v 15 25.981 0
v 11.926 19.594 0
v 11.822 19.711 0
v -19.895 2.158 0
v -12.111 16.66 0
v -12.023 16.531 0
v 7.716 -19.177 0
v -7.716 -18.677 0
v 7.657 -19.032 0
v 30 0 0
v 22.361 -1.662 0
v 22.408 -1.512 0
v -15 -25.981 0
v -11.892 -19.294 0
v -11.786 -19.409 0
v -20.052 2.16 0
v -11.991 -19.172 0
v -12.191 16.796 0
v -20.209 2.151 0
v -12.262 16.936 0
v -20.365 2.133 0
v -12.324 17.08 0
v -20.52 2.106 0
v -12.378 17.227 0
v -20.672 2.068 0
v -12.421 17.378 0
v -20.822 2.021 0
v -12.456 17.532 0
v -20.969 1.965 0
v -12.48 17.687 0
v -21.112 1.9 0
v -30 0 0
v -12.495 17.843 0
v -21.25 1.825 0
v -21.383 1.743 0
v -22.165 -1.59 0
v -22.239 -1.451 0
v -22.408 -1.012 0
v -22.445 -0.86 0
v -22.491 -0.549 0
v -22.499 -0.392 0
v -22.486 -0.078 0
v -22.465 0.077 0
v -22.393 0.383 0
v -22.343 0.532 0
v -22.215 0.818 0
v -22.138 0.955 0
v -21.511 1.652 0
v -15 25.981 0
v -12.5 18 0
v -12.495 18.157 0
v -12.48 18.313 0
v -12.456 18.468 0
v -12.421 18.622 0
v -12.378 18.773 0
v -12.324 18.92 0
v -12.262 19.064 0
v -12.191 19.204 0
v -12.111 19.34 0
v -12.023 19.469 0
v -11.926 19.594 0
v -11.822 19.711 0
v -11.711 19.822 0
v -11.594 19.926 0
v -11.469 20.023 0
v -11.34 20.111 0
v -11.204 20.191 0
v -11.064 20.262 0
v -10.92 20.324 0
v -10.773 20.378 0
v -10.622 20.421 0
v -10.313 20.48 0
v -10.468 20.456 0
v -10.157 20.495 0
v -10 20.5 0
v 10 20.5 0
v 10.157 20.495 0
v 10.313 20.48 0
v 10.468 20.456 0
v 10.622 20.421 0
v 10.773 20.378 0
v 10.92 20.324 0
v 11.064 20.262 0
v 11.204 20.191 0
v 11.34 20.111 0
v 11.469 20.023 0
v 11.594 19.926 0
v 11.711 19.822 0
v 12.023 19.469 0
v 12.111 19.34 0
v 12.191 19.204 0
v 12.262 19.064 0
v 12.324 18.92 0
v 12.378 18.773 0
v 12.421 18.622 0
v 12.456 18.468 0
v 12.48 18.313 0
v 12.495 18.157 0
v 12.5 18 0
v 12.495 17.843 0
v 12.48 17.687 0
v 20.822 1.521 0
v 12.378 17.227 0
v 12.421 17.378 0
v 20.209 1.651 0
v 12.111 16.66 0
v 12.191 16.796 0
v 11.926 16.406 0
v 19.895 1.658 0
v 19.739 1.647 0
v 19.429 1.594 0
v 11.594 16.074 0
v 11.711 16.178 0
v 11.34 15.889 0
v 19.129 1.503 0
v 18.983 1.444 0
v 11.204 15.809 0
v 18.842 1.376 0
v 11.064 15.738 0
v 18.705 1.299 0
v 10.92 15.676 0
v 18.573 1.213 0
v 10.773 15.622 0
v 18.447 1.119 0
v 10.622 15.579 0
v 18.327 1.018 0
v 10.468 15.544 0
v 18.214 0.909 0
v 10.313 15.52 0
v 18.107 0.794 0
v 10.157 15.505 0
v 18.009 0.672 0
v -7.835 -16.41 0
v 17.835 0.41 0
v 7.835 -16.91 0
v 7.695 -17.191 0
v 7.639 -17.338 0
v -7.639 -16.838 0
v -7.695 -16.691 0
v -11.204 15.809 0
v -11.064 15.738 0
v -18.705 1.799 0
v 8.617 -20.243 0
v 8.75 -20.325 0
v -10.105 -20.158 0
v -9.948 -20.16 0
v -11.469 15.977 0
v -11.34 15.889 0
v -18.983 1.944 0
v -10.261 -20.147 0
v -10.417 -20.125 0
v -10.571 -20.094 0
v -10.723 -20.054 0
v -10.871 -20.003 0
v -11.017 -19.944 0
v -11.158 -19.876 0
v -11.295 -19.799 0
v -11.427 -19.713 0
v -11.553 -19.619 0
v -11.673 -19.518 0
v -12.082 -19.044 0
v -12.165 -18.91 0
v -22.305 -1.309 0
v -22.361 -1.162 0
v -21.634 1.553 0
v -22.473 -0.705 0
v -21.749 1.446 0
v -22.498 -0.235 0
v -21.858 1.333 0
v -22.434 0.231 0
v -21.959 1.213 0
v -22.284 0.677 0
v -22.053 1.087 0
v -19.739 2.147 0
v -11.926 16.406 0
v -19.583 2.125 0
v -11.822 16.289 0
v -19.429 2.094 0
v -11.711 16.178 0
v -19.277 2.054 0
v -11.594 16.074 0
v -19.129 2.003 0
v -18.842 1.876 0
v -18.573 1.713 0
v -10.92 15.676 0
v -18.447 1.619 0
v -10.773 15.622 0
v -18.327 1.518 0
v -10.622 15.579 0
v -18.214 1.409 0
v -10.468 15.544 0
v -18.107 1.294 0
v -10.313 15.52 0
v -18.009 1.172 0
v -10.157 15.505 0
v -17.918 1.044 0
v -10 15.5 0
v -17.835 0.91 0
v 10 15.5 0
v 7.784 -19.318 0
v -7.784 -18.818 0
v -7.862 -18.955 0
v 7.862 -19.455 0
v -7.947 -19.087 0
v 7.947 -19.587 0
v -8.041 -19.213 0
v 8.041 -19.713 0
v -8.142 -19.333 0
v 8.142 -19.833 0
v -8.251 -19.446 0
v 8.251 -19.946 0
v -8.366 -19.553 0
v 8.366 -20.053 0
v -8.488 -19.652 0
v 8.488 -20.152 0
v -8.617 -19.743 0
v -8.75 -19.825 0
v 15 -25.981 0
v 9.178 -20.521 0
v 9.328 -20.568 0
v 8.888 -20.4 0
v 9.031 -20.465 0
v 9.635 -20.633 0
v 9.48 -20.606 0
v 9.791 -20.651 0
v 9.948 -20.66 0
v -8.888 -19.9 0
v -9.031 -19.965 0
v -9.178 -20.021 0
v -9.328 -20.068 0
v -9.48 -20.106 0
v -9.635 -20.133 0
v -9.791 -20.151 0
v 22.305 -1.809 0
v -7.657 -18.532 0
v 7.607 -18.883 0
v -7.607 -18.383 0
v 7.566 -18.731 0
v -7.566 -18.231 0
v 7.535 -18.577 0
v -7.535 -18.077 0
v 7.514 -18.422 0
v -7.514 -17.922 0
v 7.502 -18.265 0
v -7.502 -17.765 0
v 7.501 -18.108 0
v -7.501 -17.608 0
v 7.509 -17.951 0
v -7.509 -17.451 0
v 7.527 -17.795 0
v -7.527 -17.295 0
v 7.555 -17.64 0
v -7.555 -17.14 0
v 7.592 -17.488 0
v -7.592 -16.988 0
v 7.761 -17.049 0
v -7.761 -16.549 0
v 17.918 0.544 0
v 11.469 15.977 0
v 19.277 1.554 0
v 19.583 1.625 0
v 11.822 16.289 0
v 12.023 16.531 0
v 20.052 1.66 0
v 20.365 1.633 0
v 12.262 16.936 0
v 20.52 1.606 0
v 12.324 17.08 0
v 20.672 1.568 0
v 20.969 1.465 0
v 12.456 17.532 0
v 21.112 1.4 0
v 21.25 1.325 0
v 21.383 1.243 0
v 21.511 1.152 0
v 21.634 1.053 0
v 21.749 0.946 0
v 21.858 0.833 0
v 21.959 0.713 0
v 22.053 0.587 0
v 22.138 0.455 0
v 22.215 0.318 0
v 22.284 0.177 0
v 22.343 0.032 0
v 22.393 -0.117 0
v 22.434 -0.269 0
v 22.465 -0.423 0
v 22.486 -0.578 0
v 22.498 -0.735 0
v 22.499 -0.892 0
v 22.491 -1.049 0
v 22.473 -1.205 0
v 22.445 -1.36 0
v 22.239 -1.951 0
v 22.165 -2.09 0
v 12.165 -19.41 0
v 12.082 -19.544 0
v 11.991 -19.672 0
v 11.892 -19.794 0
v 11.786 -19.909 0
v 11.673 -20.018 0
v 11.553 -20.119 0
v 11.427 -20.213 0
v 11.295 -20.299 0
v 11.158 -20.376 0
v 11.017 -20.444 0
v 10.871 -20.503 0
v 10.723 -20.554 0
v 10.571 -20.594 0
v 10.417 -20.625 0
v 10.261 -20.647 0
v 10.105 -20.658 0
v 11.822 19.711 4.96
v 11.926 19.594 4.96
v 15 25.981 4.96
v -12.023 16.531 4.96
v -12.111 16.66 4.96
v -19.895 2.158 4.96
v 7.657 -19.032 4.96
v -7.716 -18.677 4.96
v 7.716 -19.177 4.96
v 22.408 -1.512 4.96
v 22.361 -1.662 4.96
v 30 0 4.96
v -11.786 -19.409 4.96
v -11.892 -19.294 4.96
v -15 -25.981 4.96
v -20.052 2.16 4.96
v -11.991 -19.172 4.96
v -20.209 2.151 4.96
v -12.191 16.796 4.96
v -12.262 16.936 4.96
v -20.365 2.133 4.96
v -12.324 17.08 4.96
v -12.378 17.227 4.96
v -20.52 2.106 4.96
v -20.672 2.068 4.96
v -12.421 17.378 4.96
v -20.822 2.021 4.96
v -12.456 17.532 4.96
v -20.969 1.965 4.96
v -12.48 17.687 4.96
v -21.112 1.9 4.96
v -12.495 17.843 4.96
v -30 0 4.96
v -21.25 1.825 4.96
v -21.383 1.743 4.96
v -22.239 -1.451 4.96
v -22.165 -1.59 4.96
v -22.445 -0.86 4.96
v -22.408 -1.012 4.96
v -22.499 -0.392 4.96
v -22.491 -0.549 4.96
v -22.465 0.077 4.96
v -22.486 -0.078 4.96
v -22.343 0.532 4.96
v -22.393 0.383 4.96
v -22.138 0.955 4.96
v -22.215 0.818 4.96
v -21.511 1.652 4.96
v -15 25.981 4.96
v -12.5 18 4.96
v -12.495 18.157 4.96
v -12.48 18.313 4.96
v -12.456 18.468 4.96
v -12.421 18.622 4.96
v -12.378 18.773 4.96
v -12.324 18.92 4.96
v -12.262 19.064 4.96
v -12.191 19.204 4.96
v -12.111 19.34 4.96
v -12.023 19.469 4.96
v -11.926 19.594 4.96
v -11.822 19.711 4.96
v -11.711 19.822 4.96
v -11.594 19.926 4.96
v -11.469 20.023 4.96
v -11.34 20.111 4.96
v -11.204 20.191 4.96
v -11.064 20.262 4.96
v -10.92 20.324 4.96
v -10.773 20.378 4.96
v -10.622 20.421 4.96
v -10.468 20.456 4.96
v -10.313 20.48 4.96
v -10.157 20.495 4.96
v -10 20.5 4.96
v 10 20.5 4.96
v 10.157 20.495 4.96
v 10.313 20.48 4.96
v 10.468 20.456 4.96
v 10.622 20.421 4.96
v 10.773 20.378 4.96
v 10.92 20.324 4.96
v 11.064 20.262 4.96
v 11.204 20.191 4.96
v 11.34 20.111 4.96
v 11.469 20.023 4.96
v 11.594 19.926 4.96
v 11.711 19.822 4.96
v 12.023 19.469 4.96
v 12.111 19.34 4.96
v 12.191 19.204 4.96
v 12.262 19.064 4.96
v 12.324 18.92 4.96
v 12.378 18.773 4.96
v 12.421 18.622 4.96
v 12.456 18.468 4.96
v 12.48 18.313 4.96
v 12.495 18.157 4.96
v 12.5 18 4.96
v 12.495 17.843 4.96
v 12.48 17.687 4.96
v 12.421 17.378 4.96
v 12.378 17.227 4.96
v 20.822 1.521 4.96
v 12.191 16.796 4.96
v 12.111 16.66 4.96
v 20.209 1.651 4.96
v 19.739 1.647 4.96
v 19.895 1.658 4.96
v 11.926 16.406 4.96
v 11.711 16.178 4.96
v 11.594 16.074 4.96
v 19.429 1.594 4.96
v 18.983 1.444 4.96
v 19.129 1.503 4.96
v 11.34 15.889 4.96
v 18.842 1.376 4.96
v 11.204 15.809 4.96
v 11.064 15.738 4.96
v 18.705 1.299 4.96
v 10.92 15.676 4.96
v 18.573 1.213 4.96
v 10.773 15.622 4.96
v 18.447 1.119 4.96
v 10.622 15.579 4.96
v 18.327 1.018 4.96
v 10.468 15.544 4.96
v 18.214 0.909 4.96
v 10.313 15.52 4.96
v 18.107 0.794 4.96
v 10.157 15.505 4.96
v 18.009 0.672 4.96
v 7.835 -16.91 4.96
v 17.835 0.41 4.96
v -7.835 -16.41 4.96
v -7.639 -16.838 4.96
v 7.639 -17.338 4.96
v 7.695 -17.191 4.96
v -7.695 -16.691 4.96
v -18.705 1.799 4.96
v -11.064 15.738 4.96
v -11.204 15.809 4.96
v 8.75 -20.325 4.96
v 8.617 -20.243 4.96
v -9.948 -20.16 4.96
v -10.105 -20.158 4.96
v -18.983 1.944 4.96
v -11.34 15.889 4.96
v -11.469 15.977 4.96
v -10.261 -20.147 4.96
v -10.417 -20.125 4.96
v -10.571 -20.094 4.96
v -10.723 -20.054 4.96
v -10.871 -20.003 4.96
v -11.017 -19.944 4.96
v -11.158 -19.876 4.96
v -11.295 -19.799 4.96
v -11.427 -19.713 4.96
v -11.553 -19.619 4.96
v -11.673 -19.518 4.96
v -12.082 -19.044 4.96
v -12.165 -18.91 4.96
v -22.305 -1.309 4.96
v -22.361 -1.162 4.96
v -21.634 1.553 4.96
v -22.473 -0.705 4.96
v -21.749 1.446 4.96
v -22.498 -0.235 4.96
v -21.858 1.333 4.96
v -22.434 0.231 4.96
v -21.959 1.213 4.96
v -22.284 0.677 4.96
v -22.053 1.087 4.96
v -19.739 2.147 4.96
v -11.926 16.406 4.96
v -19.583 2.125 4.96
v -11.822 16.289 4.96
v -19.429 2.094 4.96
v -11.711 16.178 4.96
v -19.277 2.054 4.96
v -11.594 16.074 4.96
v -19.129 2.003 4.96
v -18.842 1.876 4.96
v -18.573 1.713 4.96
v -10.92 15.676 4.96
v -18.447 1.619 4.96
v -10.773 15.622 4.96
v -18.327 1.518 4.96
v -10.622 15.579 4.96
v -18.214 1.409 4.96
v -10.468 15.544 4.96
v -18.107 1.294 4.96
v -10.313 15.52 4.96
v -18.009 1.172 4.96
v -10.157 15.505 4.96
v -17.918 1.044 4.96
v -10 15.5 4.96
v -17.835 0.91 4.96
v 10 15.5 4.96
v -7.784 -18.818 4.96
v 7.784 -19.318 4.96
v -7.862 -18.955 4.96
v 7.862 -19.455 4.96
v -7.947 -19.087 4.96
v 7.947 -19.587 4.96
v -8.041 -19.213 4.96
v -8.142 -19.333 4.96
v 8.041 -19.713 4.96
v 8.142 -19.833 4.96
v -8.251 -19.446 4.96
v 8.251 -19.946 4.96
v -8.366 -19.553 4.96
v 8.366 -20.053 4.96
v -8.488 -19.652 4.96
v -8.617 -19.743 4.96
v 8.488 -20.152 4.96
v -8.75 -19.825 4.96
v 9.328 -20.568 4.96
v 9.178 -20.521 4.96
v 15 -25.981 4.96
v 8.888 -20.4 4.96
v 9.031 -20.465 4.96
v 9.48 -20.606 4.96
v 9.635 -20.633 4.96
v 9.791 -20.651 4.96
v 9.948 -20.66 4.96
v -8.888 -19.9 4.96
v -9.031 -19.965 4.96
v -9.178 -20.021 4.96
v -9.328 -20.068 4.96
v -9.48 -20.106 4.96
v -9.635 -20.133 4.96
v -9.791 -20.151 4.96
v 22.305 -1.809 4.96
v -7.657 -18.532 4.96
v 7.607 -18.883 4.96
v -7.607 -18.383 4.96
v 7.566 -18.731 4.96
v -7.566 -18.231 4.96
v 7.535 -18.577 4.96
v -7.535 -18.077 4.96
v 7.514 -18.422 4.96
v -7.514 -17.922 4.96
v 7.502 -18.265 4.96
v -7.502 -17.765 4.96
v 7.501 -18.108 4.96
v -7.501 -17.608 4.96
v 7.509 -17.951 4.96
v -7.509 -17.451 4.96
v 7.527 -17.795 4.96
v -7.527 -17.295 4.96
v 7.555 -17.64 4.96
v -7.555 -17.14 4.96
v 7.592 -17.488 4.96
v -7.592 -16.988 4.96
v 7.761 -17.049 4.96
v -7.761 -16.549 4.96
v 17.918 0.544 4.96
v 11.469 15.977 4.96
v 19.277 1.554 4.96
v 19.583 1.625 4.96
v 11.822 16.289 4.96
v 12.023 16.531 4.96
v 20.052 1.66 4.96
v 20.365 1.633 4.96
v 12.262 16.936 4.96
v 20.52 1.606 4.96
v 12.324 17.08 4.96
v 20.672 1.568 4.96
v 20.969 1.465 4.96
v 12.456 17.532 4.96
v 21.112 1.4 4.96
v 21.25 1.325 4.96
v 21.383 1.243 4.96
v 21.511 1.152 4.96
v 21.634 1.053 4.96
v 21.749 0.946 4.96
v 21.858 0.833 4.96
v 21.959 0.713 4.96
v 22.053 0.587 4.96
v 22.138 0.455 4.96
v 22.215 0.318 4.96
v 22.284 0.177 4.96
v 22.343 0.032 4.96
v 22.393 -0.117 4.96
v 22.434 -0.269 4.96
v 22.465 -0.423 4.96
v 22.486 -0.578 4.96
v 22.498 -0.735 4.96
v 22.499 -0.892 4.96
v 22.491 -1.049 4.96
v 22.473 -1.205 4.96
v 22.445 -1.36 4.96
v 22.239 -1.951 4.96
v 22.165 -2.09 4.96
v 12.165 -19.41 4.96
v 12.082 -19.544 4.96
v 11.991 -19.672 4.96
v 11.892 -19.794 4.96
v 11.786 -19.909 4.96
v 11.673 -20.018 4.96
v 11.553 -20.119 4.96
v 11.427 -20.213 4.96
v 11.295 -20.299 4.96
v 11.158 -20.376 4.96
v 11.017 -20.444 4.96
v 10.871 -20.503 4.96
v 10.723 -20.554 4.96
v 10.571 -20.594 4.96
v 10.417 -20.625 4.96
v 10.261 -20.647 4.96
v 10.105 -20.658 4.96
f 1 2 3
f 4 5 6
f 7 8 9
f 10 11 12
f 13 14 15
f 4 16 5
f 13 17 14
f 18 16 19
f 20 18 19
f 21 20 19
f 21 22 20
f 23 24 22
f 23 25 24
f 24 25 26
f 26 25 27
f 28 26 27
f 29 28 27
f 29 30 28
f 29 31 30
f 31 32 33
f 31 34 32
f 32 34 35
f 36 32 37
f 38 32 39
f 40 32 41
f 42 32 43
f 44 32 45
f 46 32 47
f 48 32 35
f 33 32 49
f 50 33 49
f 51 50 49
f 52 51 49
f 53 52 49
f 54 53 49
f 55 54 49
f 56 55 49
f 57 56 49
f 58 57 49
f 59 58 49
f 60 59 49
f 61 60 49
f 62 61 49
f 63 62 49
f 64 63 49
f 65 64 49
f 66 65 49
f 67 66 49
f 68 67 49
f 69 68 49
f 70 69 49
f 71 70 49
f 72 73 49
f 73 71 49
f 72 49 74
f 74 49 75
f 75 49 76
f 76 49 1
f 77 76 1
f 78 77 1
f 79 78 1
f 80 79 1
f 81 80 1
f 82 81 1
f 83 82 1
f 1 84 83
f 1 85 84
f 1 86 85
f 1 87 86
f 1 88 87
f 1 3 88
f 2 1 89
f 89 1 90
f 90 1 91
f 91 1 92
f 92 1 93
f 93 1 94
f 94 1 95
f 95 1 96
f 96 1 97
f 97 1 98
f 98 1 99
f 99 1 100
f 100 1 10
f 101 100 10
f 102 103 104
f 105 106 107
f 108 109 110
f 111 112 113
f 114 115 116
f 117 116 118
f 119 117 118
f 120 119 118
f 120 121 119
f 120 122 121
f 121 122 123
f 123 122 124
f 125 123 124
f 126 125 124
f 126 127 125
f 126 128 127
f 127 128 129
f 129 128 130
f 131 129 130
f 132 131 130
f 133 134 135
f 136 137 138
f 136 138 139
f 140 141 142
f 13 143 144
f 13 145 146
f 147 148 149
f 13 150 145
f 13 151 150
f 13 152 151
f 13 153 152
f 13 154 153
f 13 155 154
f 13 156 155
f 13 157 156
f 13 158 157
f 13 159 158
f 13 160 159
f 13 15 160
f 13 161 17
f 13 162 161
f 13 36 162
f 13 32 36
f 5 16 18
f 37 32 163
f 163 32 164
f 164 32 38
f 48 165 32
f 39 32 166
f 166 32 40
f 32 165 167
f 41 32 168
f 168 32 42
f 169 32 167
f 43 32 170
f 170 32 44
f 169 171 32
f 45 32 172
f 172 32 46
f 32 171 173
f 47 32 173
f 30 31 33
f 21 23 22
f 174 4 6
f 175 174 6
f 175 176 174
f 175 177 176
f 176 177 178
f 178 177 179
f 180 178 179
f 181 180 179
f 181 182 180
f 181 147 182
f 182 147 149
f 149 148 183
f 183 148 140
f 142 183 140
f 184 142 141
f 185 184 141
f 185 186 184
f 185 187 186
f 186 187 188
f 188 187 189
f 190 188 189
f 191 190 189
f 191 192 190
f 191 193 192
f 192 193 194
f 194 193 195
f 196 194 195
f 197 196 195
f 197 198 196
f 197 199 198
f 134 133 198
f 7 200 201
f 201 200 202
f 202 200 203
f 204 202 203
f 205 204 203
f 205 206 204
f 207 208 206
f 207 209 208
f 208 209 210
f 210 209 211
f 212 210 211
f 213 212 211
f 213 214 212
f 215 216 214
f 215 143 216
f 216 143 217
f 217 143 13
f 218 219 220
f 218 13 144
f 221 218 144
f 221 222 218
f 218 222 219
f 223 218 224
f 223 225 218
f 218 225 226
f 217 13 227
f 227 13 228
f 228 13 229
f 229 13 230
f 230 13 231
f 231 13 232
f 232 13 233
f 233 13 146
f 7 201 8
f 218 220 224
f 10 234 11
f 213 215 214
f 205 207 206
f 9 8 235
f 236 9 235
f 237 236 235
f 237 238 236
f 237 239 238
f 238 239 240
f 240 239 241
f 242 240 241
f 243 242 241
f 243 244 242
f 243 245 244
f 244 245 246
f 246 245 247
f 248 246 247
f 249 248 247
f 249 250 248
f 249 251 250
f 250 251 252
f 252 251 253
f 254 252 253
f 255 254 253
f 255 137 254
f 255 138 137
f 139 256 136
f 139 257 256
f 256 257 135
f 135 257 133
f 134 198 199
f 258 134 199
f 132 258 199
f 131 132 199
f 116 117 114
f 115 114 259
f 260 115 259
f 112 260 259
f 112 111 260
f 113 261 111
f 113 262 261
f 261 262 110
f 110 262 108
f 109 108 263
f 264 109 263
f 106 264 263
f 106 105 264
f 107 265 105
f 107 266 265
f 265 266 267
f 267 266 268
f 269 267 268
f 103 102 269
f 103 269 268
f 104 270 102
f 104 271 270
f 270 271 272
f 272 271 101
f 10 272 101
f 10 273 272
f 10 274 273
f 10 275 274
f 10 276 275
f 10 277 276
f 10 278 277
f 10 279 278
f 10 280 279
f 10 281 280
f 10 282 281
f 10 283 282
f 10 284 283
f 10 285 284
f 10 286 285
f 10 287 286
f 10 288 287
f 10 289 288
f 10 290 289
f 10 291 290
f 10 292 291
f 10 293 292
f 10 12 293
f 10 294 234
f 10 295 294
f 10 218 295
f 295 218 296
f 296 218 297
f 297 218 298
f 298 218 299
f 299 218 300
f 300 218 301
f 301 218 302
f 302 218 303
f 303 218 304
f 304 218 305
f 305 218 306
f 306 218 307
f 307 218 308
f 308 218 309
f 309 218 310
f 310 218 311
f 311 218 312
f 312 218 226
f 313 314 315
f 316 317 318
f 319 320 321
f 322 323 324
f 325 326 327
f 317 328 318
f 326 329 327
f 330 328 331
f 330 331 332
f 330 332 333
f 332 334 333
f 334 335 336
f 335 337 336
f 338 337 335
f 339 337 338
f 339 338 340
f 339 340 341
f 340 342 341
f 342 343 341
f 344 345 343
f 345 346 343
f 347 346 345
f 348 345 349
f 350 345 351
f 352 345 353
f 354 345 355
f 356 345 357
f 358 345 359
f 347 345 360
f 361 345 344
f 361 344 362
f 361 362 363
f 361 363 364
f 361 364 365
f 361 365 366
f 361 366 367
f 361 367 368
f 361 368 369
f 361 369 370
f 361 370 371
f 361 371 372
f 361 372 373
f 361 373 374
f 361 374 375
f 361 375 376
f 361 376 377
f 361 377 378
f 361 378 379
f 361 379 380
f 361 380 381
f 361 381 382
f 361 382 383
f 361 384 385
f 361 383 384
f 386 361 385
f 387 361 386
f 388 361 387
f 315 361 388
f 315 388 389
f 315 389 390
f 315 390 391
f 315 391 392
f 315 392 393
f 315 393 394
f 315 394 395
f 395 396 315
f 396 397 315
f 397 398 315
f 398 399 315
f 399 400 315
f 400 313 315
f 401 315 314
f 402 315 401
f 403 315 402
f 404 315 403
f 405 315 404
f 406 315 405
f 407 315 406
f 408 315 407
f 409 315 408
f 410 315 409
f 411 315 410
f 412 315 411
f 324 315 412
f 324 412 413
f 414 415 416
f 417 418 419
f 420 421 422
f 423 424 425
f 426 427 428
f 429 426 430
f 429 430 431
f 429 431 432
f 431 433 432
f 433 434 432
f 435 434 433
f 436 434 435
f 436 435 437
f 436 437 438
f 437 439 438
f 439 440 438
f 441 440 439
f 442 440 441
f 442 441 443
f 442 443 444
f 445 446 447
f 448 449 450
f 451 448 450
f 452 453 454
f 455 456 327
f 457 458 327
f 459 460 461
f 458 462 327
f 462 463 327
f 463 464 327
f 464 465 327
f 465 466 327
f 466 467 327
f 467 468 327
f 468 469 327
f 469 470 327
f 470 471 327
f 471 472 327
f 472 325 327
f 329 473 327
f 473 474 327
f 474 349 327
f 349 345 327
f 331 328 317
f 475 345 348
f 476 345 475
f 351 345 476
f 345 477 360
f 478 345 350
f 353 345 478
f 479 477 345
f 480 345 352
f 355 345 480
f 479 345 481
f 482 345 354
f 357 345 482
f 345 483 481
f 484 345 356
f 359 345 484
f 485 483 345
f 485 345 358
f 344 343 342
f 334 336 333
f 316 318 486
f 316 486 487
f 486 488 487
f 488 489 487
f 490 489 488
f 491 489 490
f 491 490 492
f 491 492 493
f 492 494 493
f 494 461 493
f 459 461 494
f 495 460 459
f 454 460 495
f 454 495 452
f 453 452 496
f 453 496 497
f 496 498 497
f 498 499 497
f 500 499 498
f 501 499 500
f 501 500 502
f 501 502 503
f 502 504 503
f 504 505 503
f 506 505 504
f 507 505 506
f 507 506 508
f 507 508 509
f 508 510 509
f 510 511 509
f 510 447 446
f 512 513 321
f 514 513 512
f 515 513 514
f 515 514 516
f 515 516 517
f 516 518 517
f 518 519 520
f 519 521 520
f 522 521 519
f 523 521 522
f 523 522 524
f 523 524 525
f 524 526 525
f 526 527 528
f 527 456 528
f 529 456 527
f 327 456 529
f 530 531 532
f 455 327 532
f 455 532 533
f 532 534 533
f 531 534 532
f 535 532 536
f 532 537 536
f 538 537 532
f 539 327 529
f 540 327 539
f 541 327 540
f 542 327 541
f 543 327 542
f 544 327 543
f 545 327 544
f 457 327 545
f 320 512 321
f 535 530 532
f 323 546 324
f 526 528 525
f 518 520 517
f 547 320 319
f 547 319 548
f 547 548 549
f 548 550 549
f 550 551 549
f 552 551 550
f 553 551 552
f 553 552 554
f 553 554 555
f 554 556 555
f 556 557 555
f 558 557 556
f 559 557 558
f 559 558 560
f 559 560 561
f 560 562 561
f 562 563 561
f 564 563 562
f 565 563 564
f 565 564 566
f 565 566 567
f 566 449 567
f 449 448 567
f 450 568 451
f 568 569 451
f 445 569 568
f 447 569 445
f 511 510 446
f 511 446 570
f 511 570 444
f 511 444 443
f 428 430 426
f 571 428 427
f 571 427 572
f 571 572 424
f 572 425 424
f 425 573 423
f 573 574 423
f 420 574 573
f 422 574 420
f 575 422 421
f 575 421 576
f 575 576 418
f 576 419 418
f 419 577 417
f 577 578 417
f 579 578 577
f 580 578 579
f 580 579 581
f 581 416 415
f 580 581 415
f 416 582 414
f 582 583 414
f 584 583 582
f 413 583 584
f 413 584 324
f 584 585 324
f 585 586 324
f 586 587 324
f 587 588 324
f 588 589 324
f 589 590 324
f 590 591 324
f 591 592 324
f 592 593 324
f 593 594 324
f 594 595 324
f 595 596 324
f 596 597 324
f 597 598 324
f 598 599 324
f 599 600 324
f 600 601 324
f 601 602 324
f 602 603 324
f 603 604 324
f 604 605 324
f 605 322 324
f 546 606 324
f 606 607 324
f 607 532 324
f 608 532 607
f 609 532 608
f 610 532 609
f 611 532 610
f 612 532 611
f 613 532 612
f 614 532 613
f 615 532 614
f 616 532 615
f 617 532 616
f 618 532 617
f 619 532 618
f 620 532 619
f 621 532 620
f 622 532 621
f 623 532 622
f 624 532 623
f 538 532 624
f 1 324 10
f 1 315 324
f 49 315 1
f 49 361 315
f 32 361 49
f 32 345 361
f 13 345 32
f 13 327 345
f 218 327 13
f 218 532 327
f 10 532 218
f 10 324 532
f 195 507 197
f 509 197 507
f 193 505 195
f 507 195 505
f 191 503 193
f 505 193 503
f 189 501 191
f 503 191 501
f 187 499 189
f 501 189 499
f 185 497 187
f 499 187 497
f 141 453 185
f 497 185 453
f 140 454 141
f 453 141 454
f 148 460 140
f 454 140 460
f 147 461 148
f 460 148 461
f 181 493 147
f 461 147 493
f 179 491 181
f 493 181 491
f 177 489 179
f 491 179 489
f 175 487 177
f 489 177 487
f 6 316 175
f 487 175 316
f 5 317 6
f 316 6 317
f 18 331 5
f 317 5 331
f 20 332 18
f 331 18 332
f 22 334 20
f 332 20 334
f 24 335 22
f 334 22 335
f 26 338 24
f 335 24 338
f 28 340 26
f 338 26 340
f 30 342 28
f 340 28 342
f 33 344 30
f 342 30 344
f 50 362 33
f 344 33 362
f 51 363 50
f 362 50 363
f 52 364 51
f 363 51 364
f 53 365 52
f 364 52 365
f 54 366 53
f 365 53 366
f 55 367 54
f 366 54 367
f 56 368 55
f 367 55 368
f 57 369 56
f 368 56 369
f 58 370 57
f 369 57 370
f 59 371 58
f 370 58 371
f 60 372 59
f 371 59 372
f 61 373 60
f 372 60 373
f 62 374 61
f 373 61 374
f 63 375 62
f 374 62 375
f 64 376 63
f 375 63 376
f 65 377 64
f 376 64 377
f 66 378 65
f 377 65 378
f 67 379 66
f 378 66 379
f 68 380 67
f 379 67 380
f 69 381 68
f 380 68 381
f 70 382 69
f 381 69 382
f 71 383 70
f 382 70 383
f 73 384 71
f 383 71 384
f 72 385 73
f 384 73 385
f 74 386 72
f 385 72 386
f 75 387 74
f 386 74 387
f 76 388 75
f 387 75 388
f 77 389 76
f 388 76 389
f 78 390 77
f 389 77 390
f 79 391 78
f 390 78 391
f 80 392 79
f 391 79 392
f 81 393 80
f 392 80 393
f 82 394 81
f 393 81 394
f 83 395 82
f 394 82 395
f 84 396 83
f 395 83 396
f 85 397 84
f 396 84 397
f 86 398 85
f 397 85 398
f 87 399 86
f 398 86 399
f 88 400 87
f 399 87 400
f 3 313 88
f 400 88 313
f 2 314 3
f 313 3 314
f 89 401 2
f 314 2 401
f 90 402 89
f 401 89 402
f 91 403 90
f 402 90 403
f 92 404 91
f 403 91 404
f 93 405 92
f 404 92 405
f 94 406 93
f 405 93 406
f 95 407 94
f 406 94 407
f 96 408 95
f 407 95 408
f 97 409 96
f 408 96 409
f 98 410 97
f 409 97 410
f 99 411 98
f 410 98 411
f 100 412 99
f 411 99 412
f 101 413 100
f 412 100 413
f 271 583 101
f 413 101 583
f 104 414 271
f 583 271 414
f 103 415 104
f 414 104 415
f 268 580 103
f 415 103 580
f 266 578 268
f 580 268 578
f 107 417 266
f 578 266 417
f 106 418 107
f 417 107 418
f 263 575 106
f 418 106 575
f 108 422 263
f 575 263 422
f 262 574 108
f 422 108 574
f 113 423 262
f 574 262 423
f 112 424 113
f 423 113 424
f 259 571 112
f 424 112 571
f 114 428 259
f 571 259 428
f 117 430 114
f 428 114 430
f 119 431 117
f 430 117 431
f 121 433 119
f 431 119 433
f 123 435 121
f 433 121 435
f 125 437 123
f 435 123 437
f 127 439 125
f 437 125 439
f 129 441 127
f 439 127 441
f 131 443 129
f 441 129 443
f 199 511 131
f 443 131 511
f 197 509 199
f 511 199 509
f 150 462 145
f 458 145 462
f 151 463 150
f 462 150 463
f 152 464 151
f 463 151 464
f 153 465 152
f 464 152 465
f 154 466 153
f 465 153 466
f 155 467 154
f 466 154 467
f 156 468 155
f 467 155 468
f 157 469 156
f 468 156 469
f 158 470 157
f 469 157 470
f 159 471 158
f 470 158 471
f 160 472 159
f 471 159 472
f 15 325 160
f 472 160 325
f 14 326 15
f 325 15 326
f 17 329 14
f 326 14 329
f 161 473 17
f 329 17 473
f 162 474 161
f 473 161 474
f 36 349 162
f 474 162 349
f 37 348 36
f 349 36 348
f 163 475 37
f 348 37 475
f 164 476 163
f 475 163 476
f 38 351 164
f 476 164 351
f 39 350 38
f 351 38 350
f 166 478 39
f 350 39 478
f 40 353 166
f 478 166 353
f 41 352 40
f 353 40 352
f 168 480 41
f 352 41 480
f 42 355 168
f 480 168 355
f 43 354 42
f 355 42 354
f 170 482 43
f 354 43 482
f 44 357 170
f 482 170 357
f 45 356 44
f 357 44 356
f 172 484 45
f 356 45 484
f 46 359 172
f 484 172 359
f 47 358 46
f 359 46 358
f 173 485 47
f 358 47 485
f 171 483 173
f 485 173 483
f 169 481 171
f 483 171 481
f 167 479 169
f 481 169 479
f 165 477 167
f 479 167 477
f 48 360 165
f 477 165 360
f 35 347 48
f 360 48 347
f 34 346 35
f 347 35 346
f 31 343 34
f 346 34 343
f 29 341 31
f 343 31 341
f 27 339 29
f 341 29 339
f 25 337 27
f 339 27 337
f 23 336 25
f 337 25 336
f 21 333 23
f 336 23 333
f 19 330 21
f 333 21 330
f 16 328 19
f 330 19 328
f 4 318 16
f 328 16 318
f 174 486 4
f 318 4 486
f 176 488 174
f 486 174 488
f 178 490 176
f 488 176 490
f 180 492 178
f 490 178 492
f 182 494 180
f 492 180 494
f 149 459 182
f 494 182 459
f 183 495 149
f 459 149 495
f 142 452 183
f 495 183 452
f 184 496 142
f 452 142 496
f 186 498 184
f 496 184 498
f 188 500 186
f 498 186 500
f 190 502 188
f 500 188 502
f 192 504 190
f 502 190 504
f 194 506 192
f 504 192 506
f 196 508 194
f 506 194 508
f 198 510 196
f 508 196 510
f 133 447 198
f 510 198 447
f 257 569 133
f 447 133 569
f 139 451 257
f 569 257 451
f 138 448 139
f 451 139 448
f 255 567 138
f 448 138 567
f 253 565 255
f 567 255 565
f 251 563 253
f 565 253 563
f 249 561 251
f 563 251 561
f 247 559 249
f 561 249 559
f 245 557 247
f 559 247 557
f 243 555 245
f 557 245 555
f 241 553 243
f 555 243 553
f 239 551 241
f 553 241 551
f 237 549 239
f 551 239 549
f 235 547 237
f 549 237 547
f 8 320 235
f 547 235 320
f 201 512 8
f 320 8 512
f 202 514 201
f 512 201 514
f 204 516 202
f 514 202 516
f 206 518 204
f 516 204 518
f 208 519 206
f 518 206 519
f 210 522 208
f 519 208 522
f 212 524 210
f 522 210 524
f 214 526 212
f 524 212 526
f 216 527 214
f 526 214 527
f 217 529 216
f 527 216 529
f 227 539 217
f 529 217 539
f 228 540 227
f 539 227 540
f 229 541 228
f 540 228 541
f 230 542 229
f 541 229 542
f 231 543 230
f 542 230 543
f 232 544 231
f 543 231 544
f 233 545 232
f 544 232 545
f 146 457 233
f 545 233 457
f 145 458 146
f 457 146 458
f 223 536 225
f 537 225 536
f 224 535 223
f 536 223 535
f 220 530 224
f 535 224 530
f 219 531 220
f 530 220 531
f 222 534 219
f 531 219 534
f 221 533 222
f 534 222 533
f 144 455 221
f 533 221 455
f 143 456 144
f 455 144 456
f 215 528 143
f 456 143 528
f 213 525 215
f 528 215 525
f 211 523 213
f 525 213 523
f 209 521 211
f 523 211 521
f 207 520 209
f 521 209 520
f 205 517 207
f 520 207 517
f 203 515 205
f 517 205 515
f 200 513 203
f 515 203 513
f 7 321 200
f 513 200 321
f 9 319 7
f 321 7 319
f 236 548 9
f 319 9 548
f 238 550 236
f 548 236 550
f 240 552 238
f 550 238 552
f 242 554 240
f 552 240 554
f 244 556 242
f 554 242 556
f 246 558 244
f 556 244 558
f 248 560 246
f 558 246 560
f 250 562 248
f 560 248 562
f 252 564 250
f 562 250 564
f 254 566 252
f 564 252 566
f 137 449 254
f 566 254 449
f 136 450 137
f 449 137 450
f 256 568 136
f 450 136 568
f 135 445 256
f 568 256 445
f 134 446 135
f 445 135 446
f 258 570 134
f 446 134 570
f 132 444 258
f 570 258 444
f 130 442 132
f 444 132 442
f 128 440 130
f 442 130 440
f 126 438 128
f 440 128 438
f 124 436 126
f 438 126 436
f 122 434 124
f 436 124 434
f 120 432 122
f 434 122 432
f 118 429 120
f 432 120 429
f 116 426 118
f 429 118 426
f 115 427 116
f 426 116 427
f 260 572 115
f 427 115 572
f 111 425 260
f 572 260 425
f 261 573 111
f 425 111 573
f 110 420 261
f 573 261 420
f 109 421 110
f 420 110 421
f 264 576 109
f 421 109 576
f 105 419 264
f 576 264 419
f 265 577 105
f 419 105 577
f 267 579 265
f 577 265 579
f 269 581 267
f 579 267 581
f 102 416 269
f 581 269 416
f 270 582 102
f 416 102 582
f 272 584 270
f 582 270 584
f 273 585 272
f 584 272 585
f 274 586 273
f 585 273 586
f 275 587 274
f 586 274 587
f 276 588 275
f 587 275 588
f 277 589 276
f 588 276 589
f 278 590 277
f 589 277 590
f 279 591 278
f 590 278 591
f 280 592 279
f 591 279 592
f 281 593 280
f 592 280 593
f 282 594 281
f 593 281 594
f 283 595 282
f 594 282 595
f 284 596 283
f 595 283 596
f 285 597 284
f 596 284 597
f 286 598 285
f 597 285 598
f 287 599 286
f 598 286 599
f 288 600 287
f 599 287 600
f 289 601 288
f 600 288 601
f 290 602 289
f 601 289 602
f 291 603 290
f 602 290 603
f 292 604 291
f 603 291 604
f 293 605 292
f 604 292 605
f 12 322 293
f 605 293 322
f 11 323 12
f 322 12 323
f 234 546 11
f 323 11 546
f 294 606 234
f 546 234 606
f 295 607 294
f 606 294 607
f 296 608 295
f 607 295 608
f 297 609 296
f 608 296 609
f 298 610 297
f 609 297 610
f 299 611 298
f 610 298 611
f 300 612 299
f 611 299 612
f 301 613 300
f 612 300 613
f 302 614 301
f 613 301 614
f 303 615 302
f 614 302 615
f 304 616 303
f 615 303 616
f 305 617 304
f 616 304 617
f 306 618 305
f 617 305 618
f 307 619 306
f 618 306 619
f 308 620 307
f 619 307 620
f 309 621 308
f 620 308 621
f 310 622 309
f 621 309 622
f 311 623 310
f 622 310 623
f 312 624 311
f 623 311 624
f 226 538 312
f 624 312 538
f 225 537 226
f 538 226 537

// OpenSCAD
/*

*/

$fn=100;
NozzleWidth = 1.0;
LayerHeight = 0.24;
InitialLayerHeight = 0.4;
mmPerInch = 25.4;
wallCount = 2;

function InchTomm(inches = 1) = inches * mmPerInch;
function height2layers(mm = 1) = mm/LayerHeight;
function layers2Height(layers) = InitialLayerHeight + ((layers - 1) * LayerHeight);
function BaseHeight() = layers2Height(6);
function WallThickness(count) = count * NozzleWidth;

Build();

module Build(args) 
{
    Tool();
}

module Tool()
{
    radius = 30;
    xvalue = -10;
    slotWidth = 20;
    slotRadius = 2.5;
    WallThickness = WallThickness(9.5);
    echo( xymove=xymove(angle= 90, width = radius));

    linear_extrude(height = layers2Height(20))
    {    
    difference()
        {
            circle(r=radius, $fn=6);
            
            translate([0,18,0])      
            hull() 
            {
                translate([-slotWidth/2,0,0])
                circle(r=slotRadius);

                translate([slotWidth/2,0,0])    
                circle(r=slotRadius);
            }
            
            translate([-15,-9,0])      
            rotate([0, 0, -240]) 

            hull() 
            {
                translate([-slotWidth/2,0,0])
                circle(r=slotRadius);
                
                translate([slotWidth/2,0,0])    
                circle(r=slotRadius);
            }

            translate( [15,-9.5,0])
            rotate([0, 0, 60]) 
            hull() 
            {
                translate([-slotWidth/2,0,0])
                circle(r=slotRadius);
                
                translate([slotWidth/2,0,0])    
                circle(r=slotRadius);
            }        
        }
    }

    // zvalue = 8;
    // translate([0, 0, zvalue])
    // #square(size=[60, 1], center=true);
    // translate([0, 0, zvalue])
    // rotate([0, 0, 60])
    // #square(size=[100, 1], center=true);
    // translate([0, 0, zvalue])
    // rotate([0, 0, -60])
    // #square(size=[100, 1], center=true);    
    function foobar() = radius - bar() ;
    function bar() = (slotRadius * 2 + WallThickness) ;
    function xymove(angle, width) = [cos(angle) * (width - WallThickness), sin(angle) * (width - WallThickness), 0];
}
